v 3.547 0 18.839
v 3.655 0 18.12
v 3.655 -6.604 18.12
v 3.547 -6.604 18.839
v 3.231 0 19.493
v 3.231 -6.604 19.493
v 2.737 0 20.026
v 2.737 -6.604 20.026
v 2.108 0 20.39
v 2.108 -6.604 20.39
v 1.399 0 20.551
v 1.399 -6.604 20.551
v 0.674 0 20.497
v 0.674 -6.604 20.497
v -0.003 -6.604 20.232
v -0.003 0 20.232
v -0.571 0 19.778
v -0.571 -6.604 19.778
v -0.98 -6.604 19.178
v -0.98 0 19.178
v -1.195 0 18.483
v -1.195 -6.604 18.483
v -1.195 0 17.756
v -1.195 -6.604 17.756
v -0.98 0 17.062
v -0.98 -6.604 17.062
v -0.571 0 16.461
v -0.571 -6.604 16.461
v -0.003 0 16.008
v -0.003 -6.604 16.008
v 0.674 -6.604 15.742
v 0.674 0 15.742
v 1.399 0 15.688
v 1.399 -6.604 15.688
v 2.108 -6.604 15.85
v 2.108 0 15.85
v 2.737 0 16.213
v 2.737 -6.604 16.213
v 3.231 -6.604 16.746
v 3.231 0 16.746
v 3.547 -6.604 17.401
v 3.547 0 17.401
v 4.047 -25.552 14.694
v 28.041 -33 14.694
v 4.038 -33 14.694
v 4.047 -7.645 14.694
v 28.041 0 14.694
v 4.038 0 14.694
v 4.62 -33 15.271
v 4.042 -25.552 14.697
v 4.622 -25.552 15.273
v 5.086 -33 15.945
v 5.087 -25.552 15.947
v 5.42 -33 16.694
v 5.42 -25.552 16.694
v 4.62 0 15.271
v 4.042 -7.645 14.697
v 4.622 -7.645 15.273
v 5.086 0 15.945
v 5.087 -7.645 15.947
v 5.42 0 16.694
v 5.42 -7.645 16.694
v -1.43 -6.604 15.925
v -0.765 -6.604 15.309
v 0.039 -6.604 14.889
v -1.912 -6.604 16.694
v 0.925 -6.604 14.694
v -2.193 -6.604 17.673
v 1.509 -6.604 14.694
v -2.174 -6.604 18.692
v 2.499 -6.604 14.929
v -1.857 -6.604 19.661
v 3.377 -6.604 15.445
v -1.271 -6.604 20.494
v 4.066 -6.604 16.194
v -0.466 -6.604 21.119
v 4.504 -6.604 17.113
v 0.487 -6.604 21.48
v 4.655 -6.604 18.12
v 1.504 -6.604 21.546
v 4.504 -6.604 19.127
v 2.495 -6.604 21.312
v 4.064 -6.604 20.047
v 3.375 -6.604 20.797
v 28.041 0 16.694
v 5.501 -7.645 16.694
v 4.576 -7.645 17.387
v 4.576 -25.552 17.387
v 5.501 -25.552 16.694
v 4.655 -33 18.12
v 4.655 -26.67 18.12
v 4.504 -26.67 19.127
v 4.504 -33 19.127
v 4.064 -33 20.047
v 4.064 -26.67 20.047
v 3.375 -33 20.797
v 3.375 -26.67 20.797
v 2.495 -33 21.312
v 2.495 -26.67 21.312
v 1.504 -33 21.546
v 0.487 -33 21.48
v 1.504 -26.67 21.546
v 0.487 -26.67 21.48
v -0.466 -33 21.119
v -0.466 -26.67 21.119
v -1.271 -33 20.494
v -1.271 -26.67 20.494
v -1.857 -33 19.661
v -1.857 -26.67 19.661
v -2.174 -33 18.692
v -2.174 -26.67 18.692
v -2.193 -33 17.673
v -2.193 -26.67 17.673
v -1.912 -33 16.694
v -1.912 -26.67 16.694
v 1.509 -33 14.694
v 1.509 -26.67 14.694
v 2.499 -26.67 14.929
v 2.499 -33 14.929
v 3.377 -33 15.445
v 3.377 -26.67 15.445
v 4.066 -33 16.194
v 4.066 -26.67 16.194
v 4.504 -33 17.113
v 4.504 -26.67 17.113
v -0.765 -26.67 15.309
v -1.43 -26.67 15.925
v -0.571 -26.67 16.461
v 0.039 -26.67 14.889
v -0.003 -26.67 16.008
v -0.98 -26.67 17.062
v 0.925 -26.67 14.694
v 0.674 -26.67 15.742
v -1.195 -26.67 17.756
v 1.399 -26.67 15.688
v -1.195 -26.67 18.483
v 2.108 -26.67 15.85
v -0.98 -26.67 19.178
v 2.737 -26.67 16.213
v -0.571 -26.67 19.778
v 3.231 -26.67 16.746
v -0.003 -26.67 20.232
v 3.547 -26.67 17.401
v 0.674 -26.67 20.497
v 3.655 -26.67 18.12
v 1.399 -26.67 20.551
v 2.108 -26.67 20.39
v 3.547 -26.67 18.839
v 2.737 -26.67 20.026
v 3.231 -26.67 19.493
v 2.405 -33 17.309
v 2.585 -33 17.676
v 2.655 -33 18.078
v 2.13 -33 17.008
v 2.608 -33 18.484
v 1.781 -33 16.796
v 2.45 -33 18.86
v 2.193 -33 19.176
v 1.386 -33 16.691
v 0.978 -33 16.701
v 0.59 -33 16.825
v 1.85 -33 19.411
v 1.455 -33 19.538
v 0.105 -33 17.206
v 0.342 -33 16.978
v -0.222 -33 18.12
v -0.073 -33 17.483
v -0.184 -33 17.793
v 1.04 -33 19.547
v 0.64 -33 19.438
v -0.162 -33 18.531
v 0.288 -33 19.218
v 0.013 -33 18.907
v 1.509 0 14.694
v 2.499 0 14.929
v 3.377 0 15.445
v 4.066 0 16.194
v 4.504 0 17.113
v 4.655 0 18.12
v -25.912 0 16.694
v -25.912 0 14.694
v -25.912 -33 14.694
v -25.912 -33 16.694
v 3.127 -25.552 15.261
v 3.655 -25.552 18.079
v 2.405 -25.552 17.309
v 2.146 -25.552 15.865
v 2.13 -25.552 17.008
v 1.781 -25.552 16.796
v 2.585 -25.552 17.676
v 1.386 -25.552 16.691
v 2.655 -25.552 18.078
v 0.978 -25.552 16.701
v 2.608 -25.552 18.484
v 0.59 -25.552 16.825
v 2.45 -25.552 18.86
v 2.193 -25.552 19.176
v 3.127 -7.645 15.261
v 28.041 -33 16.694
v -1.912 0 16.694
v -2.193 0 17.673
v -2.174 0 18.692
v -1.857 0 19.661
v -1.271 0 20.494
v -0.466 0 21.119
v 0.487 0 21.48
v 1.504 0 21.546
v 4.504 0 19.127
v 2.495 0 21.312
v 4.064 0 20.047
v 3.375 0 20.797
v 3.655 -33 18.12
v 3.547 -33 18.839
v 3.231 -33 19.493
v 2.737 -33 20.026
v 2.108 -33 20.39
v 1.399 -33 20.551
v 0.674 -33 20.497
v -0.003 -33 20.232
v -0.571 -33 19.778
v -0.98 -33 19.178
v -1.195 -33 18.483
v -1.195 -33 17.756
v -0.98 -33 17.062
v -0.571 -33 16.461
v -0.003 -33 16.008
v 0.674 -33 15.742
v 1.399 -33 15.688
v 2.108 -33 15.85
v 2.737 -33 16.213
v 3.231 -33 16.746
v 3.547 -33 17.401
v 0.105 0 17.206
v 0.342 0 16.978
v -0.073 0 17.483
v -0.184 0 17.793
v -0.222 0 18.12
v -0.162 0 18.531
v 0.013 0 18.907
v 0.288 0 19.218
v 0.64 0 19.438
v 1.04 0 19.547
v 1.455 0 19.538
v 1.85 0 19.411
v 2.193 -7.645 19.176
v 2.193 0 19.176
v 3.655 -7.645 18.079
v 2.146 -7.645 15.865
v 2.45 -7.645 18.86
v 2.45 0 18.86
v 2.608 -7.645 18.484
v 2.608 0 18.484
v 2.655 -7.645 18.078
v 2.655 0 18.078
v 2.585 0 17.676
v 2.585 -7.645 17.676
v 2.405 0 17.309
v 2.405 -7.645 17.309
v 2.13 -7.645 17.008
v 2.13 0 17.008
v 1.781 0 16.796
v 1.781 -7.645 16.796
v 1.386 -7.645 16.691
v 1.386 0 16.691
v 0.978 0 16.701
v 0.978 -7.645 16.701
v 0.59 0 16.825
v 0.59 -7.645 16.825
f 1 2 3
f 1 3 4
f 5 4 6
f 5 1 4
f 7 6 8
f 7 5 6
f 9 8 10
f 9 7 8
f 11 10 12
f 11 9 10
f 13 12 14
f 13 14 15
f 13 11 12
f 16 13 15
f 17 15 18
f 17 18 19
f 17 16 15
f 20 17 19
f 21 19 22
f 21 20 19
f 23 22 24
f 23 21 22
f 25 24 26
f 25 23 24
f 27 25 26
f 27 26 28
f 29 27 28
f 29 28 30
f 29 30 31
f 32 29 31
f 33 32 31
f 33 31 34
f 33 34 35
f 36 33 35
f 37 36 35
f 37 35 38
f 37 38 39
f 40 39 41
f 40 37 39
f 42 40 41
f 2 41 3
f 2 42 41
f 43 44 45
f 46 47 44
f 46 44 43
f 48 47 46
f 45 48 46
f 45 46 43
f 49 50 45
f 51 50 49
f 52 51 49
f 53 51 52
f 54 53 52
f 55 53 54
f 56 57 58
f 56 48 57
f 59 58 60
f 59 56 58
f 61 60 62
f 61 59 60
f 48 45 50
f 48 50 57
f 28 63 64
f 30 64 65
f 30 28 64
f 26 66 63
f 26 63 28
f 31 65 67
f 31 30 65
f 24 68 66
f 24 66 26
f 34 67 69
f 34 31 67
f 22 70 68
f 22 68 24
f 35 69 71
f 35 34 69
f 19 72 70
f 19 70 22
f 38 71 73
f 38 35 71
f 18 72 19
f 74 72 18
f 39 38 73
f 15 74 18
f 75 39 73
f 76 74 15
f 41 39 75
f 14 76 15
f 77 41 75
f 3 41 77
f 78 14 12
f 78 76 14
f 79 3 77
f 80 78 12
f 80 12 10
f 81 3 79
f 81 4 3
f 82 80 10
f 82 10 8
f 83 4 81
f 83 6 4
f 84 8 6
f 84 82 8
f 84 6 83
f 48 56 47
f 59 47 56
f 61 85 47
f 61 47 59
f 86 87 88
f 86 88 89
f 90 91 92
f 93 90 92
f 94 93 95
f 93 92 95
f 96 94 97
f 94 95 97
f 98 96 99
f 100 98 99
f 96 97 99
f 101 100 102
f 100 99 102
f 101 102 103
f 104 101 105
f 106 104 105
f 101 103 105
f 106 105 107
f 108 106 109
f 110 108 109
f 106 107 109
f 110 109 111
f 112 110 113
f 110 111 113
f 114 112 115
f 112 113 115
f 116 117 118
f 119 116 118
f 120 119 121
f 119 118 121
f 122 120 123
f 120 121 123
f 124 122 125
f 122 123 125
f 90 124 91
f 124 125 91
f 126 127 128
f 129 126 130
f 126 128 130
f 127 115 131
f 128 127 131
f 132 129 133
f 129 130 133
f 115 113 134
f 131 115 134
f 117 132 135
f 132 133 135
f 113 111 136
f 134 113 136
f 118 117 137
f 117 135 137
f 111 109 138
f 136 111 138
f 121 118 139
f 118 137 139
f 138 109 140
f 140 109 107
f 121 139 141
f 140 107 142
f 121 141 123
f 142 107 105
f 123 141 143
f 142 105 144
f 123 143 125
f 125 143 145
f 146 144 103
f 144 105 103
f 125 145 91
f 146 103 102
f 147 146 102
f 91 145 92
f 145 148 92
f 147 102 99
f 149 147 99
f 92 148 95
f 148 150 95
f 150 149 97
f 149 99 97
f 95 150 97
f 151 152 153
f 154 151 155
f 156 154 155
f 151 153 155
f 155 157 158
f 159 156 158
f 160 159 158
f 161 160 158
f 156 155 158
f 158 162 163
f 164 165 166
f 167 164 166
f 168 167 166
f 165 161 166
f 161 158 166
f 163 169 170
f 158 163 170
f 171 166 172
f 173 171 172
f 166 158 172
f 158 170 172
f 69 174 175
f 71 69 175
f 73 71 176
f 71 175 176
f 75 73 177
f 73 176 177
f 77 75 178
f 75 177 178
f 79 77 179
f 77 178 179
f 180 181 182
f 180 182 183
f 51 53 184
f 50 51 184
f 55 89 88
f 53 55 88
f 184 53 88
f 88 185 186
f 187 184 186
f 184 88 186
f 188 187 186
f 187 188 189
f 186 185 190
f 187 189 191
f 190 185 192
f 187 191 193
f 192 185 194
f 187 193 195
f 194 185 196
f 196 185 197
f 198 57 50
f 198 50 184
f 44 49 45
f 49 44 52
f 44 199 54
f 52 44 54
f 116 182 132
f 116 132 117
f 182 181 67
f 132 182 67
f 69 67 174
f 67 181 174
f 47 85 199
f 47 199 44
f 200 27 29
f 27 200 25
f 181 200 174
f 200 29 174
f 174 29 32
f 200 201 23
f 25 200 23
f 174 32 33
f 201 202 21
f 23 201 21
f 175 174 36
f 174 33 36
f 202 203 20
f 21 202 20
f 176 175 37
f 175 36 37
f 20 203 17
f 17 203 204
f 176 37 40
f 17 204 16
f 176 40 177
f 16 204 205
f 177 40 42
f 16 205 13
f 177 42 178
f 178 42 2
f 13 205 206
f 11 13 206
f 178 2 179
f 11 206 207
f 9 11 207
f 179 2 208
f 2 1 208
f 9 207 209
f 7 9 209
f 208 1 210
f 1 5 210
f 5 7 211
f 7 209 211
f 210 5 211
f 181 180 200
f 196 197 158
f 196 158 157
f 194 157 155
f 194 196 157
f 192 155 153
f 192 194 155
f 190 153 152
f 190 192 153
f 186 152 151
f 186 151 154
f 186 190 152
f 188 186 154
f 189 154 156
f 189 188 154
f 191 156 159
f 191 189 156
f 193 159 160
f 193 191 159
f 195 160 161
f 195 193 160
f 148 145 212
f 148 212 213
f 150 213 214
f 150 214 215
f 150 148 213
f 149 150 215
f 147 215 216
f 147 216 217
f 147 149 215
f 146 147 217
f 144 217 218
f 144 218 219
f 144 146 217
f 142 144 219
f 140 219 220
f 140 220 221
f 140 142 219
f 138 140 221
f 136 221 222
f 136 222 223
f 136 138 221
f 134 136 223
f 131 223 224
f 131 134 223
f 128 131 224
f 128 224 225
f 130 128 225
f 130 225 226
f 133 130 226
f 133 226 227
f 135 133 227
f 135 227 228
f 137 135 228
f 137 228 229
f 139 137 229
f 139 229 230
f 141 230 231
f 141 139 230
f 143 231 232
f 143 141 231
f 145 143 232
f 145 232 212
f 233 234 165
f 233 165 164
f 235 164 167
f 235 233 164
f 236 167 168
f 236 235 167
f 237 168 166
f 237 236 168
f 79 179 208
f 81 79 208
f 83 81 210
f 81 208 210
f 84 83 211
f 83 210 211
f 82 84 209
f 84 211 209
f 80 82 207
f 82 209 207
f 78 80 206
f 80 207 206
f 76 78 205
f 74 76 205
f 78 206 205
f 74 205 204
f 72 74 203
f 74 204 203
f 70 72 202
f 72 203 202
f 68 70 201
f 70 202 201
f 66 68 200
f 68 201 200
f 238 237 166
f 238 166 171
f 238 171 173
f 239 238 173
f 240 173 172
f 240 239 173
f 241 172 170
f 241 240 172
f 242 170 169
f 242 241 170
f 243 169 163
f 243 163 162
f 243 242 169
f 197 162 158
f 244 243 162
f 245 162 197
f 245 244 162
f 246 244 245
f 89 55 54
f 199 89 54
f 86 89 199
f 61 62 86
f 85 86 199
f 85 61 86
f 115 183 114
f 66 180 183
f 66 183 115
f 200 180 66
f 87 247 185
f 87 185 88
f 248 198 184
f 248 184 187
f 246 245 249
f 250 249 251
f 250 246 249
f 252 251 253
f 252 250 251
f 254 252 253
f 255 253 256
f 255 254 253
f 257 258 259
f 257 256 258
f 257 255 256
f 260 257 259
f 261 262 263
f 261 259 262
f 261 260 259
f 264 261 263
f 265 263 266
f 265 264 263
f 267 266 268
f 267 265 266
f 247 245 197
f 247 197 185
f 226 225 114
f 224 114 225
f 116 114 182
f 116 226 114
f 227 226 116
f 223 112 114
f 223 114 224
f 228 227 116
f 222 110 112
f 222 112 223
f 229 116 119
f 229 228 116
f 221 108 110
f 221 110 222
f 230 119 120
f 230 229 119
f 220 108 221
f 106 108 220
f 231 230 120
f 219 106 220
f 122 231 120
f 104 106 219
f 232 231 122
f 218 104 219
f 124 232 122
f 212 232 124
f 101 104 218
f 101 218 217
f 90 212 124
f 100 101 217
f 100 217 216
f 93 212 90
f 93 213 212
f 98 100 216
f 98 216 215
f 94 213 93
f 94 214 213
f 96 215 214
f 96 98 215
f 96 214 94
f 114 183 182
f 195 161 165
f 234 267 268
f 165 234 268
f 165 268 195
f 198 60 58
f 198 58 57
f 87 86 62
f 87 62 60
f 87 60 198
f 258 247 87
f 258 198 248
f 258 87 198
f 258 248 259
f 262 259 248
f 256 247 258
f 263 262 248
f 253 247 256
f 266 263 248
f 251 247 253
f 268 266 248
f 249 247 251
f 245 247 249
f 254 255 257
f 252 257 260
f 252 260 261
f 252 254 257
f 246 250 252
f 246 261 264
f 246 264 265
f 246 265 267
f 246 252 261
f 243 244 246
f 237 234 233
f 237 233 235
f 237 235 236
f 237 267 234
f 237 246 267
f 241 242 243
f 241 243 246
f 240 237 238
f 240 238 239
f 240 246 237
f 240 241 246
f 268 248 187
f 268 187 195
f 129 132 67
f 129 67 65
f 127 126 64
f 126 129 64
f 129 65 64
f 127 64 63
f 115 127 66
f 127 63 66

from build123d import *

# Parameters (mm, degrees)
F0_W     = 24
F0_H     = 2
F1_DEPTH = 33
F0_R     = 2.4385073591
F2_DEPTH = 6.604
F3_START = 26.67
F3_DEPTH = 6.33
F5_DEPTH = 33
F7_DEPTH = 33
F8_START = -7.6454
F8_DEPTH = 17.907


with BuildPart() as f1:
    # F0 (on Front) → F1 (new body)
    with BuildSketch(Plane.XZ):
        with Locations((-13.9121894147, 15.6936606616)):
            Rectangle(F0_W, F0_H)
        with BuildLine():
            ThreePointArc((0.9247052946, 14.6936606616), (-0.764623467, 15.3094296465), (-1.9121894147, 16.6936606616))
            Line((-1.9121894147, 16.6936606616), (-1.9121894147, 14.6936606616))
            Line((-1.9121894147, 14.6936606616), (0.9247052946, 14.6936606616))
        make_face()
    extrude(amount=F1_DEPTH)

    # F0 (on Front) → F2 (join)
    with BuildSketch(Plane.XZ):
        with BuildLine():
            ThreePointArc((4.6551508029, 18.1197524549), (0.4869798056, 21.4799494482), (-1.9121894147, 16.6936606616))
            ThreePointArc((-1.9121894147, 16.6936606616), (-0.764623467, 15.3094296465), (0.9247052946, 14.6936606616))
            Line((0.9247052946, 14.6936606616), (1.5085815929, 14.6936606616))
            ThreePointArc((1.5085815929, 14.6936606616), (3.7491485605, 15.7938653784), (4.6551508029, 18.1197524549))
        make_face()
        with Locations((1.2166434437, 18.1197524549)):
            Circle(F0_R, mode=Mode.SUBTRACT)
    extrude(amount=F2_DEPTH)

    # F0 (on Front) → F3 (join)
    with BuildSketch(Plane.XZ.offset(F3_START)):
        with BuildLine():
            ThreePointArc((4.6551508029, 18.1197524549), (0.4869798056, 21.4799494482), (-1.9121894147, 16.6936606616))
            ThreePointArc((-1.9121894147, 16.6936606616), (-0.764623467, 15.3094296465), (0.9247052946, 14.6936606616))
            Line((0.9247052946, 14.6936606616), (1.5085815929, 14.6936606616))
            ThreePointArc((1.5085815929, 14.6936606616), (3.7491485605, 15.7938653784), (4.6551508029, 18.1197524549))
        make_face()
        with Locations((1.2166434437, 18.1197524549)):
            Circle(F0_R, mode=Mode.SUBTRACT)
    extrude(amount=F3_DEPTH)


with BuildPart() as f5:
    # F4 (on face) → F5 (new body, through all)
    with BuildSketch(Plane(origin=(0, 0, 0), x_dir=(-1, 0, 0), z_dir=(0, 1, 0))):
        with BuildLine():
            Line((-15.8450398594, 14.6936606616), (-4.0383880461, 14.6936606616))
            ThreePointArc((-4.0383880461, 14.6936606616), (-4.8686763678, 15.5972530795), (-5.4198100802, 16.6936606616))
            Line((-5.4198100802, 16.6936606616), (-10.0691048428, 16.6936606616))
            Line((-10.0691048428, 16.6936606616), (-28.0413880461, 16.6936606616))
            Line((-28.0413880461, 16.6936606616), (-28.0413880461, 14.6936606616))
            Line((-28.0413880461, 14.6936606616), (-15.8450398594, 14.6936606616))
        make_face()
    extrude(amount=-F5_DEPTH)



with BuildPart() as f7:
    # F6 (on face) → F7 (new body, through all)
    with BuildSketch(Plane(origin=(0, 0, 0), x_dir=(-1, 0, 0), z_dir=(0, 1, 0))):
        with BuildLine():
            ThreePointArc((-0.3418582309, 16.9778005059), (0.073257403, 17.4829956504), (0.2218639154, 18.1197524549))
            ThreePointArc((0.2218639154, 18.1197524549), (-0.6399254334, 19.4375915038), (-2.1927219368, 19.1764332002))
            ThreePointArc((-2.1927219368, 19.1764332002), (-2.4051657689, 17.3093709984), (-0.5895183864, 16.8251414767))
            Line((-0.5895183864, 16.8251414767), (-0.3418582309, 16.9778005059))
        make_face()
    extrude(amount=-F7_DEPTH)


with BuildPart() as f5_1:
    add(f5.part)

    add(f7.part)  # F8 merges F7
    # F6 (on face) → F8 (join)
    with BuildSketch(Plane(origin=(0, 0, 0), x_dir=(-1, 0, 0), z_dir=(0, 1, 0)).offset(F8_START)):
        with BuildLine():
            ThreePointArc((-3.1272102801, 15.2608947769), (-4.0581637221, 16.1834943713), (-4.5762601156, 17.3874214661))
            Line((-4.5762601156, 17.3874214661), (-5.6122234091, 16.6098587215))
            Line((-5.6122234091, 16.6098587215), (-4.681289196, 14.9995945394))
            Line((-4.681289196, 14.9995945394), (-4.0474394336, 14.6936606616))
            Line((-4.0474394336, 14.6936606616), (-3.1272102801, 15.2608947769))
        make_face()
        with BuildLine():
            ThreePointArc((-0.5895183864, 16.8251414767), (-2.4051657689, 17.3093709984), (-2.1927219368, 19.1764332002))
            Line((-2.1927219368, 19.1764332002), (-3.6548108098, 18.0790334718))
            ThreePointArc((-3.6548108098, 18.0790334718), (-3.231770478, 16.7465877975), (-2.1464189491, 15.8654597387))
            Line((-2.1464189491, 15.8654597387), (-0.5895183864, 16.8251414767))
        make_face()
        with BuildLine():
            ThreePointArc((-2.1464189491, 15.8654597387), (-3.231770478, 16.7465877975), (-3.6548108098, 18.0790334718))
            Line((-3.6548108098, 18.0790334718), (-4.5762601156, 17.3874214661))
            ThreePointArc((-4.5762601156, 17.3874214661), (-4.0581637221, 16.1834943713), (-3.1272102801, 15.2608947769))
            Line((-3.1272102801, 15.2608947769), (-2.1464189491, 15.8654597387))
        make_face()
    extrude(amount=-F8_DEPTH)


solid = Compound([f1.part, f5_1.part])
